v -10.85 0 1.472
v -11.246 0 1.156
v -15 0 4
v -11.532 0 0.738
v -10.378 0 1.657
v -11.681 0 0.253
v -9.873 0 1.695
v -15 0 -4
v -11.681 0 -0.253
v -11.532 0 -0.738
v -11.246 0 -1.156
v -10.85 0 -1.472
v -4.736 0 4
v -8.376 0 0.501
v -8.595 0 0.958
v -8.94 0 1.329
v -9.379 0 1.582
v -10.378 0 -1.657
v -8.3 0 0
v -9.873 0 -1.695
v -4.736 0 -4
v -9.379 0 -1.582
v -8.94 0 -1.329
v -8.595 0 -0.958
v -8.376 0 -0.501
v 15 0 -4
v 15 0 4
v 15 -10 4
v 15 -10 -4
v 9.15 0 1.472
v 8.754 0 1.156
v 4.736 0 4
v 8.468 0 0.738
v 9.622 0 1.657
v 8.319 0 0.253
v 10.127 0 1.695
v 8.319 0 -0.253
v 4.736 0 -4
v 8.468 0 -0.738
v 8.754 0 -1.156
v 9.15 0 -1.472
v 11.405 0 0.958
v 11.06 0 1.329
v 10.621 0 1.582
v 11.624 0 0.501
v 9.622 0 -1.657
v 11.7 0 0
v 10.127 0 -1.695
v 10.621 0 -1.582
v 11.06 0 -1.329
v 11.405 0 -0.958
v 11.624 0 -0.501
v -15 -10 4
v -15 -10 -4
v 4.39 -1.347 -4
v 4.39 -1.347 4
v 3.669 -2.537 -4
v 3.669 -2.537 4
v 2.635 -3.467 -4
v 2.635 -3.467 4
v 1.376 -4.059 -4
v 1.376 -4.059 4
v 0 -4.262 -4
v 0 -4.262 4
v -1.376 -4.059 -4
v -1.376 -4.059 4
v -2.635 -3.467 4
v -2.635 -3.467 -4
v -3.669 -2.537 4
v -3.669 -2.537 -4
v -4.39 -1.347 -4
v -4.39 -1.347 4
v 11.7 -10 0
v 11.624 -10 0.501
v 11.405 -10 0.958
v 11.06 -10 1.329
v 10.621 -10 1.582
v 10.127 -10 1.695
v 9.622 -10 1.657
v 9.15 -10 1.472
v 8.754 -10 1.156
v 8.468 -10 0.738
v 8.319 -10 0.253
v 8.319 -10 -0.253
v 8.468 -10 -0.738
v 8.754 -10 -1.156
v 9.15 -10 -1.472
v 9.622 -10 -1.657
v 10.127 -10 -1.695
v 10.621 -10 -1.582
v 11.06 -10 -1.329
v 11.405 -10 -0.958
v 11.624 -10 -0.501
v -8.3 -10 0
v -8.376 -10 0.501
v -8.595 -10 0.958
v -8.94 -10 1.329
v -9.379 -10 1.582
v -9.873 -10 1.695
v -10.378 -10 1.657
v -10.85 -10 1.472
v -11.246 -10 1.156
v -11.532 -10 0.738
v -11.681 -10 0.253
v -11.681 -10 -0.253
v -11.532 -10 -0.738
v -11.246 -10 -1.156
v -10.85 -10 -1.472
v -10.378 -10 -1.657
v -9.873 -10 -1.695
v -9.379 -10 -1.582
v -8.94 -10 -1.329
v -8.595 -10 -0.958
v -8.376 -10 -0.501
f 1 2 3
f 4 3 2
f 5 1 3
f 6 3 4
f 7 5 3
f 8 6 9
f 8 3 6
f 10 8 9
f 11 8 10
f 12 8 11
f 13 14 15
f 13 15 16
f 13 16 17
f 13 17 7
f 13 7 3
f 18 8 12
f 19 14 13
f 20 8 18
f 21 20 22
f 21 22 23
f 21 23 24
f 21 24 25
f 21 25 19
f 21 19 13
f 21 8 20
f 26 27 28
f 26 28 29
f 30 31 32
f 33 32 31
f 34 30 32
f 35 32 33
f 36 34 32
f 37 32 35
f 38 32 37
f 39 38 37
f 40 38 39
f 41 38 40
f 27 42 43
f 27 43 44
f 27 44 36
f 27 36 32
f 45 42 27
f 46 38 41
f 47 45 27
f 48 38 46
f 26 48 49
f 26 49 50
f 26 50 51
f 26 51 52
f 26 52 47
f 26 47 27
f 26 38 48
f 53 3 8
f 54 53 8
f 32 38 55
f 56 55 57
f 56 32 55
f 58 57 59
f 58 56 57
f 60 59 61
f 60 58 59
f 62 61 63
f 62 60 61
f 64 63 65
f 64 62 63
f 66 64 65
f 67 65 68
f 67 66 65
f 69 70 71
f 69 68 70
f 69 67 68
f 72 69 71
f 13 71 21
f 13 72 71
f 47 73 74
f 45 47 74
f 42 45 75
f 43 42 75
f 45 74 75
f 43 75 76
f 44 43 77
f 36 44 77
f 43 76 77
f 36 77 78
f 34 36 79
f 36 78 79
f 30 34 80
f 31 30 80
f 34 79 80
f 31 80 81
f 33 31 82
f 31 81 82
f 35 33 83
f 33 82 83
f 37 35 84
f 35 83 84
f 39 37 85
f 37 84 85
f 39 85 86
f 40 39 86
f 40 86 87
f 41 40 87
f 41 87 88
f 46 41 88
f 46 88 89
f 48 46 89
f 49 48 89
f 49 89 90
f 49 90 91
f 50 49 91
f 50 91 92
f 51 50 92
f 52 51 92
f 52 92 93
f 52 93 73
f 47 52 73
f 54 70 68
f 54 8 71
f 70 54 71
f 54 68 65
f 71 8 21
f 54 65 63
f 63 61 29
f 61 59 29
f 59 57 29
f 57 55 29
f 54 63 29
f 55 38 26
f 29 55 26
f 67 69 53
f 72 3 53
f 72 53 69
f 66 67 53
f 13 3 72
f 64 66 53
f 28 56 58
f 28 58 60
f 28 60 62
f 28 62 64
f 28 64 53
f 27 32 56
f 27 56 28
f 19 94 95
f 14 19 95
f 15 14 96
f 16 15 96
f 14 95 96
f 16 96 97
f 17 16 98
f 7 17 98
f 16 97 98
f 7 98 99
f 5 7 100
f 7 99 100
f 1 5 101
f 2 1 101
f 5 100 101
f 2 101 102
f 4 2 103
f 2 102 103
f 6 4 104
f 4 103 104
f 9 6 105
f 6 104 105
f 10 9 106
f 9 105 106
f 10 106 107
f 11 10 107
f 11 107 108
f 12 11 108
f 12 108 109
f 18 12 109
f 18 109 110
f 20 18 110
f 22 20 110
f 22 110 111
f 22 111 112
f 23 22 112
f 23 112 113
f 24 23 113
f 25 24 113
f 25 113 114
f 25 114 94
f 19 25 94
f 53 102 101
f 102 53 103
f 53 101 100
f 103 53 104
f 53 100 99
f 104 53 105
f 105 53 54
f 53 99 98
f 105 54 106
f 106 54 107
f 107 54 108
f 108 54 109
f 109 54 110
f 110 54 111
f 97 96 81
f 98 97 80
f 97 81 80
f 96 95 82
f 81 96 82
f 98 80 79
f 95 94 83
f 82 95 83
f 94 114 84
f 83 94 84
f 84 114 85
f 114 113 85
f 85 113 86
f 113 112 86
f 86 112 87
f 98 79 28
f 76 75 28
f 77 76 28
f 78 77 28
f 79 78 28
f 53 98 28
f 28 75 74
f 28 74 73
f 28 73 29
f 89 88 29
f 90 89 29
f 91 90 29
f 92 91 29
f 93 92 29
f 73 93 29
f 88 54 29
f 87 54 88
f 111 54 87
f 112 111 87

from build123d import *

# Parameters (mm, degrees)
SKETCH1_W            = 30
SKETCH1_H            = 8
BOSS_EXTRUDE1_DEPTH  = 10
M3_CLEARANCE_HOLE1_D = 3.4
CUT_EXTRUDE1_DEPTH   = 20.723082923


with BuildPart() as part:
    # Sketch1 → Boss-Extrude1 (new body)
    with BuildSketch(Plane(origin=(0, 0, 0), x_dir=(1, 0, 0), z_dir=(0, 1, 0))):
        Rectangle(SKETCH1_W, SKETCH1_H)
    extrude(amount=-BOSS_EXTRUDE1_DEPTH)

    # M3 Clearance Hole1 (through all)
    with Locations(Plane(origin=(0, 0, 0), x_dir=(-1, 0, 0), z_dir=(0, 1, 0))):
        with Locations((10, 0), (-10, 0)):
            Hole(M3_CLEARANCE_HOLE1_D / 2)

    # Sketch2 → Cut-Extrude1 (cut, through all)
    with BuildSketch(Plane.XY.offset(4)):
        with BuildLine():
            Line((-4.736180555, 0), (4.736180555, 0))
            ThreePointArc((4.736180555, 0), (0, -4.2625), (-4.736180555, 0))
        make_face()
    extrude(amount=-CUT_EXTRUDE1_DEPTH, mode=Mode.SUBTRACT)


solid = part.part
